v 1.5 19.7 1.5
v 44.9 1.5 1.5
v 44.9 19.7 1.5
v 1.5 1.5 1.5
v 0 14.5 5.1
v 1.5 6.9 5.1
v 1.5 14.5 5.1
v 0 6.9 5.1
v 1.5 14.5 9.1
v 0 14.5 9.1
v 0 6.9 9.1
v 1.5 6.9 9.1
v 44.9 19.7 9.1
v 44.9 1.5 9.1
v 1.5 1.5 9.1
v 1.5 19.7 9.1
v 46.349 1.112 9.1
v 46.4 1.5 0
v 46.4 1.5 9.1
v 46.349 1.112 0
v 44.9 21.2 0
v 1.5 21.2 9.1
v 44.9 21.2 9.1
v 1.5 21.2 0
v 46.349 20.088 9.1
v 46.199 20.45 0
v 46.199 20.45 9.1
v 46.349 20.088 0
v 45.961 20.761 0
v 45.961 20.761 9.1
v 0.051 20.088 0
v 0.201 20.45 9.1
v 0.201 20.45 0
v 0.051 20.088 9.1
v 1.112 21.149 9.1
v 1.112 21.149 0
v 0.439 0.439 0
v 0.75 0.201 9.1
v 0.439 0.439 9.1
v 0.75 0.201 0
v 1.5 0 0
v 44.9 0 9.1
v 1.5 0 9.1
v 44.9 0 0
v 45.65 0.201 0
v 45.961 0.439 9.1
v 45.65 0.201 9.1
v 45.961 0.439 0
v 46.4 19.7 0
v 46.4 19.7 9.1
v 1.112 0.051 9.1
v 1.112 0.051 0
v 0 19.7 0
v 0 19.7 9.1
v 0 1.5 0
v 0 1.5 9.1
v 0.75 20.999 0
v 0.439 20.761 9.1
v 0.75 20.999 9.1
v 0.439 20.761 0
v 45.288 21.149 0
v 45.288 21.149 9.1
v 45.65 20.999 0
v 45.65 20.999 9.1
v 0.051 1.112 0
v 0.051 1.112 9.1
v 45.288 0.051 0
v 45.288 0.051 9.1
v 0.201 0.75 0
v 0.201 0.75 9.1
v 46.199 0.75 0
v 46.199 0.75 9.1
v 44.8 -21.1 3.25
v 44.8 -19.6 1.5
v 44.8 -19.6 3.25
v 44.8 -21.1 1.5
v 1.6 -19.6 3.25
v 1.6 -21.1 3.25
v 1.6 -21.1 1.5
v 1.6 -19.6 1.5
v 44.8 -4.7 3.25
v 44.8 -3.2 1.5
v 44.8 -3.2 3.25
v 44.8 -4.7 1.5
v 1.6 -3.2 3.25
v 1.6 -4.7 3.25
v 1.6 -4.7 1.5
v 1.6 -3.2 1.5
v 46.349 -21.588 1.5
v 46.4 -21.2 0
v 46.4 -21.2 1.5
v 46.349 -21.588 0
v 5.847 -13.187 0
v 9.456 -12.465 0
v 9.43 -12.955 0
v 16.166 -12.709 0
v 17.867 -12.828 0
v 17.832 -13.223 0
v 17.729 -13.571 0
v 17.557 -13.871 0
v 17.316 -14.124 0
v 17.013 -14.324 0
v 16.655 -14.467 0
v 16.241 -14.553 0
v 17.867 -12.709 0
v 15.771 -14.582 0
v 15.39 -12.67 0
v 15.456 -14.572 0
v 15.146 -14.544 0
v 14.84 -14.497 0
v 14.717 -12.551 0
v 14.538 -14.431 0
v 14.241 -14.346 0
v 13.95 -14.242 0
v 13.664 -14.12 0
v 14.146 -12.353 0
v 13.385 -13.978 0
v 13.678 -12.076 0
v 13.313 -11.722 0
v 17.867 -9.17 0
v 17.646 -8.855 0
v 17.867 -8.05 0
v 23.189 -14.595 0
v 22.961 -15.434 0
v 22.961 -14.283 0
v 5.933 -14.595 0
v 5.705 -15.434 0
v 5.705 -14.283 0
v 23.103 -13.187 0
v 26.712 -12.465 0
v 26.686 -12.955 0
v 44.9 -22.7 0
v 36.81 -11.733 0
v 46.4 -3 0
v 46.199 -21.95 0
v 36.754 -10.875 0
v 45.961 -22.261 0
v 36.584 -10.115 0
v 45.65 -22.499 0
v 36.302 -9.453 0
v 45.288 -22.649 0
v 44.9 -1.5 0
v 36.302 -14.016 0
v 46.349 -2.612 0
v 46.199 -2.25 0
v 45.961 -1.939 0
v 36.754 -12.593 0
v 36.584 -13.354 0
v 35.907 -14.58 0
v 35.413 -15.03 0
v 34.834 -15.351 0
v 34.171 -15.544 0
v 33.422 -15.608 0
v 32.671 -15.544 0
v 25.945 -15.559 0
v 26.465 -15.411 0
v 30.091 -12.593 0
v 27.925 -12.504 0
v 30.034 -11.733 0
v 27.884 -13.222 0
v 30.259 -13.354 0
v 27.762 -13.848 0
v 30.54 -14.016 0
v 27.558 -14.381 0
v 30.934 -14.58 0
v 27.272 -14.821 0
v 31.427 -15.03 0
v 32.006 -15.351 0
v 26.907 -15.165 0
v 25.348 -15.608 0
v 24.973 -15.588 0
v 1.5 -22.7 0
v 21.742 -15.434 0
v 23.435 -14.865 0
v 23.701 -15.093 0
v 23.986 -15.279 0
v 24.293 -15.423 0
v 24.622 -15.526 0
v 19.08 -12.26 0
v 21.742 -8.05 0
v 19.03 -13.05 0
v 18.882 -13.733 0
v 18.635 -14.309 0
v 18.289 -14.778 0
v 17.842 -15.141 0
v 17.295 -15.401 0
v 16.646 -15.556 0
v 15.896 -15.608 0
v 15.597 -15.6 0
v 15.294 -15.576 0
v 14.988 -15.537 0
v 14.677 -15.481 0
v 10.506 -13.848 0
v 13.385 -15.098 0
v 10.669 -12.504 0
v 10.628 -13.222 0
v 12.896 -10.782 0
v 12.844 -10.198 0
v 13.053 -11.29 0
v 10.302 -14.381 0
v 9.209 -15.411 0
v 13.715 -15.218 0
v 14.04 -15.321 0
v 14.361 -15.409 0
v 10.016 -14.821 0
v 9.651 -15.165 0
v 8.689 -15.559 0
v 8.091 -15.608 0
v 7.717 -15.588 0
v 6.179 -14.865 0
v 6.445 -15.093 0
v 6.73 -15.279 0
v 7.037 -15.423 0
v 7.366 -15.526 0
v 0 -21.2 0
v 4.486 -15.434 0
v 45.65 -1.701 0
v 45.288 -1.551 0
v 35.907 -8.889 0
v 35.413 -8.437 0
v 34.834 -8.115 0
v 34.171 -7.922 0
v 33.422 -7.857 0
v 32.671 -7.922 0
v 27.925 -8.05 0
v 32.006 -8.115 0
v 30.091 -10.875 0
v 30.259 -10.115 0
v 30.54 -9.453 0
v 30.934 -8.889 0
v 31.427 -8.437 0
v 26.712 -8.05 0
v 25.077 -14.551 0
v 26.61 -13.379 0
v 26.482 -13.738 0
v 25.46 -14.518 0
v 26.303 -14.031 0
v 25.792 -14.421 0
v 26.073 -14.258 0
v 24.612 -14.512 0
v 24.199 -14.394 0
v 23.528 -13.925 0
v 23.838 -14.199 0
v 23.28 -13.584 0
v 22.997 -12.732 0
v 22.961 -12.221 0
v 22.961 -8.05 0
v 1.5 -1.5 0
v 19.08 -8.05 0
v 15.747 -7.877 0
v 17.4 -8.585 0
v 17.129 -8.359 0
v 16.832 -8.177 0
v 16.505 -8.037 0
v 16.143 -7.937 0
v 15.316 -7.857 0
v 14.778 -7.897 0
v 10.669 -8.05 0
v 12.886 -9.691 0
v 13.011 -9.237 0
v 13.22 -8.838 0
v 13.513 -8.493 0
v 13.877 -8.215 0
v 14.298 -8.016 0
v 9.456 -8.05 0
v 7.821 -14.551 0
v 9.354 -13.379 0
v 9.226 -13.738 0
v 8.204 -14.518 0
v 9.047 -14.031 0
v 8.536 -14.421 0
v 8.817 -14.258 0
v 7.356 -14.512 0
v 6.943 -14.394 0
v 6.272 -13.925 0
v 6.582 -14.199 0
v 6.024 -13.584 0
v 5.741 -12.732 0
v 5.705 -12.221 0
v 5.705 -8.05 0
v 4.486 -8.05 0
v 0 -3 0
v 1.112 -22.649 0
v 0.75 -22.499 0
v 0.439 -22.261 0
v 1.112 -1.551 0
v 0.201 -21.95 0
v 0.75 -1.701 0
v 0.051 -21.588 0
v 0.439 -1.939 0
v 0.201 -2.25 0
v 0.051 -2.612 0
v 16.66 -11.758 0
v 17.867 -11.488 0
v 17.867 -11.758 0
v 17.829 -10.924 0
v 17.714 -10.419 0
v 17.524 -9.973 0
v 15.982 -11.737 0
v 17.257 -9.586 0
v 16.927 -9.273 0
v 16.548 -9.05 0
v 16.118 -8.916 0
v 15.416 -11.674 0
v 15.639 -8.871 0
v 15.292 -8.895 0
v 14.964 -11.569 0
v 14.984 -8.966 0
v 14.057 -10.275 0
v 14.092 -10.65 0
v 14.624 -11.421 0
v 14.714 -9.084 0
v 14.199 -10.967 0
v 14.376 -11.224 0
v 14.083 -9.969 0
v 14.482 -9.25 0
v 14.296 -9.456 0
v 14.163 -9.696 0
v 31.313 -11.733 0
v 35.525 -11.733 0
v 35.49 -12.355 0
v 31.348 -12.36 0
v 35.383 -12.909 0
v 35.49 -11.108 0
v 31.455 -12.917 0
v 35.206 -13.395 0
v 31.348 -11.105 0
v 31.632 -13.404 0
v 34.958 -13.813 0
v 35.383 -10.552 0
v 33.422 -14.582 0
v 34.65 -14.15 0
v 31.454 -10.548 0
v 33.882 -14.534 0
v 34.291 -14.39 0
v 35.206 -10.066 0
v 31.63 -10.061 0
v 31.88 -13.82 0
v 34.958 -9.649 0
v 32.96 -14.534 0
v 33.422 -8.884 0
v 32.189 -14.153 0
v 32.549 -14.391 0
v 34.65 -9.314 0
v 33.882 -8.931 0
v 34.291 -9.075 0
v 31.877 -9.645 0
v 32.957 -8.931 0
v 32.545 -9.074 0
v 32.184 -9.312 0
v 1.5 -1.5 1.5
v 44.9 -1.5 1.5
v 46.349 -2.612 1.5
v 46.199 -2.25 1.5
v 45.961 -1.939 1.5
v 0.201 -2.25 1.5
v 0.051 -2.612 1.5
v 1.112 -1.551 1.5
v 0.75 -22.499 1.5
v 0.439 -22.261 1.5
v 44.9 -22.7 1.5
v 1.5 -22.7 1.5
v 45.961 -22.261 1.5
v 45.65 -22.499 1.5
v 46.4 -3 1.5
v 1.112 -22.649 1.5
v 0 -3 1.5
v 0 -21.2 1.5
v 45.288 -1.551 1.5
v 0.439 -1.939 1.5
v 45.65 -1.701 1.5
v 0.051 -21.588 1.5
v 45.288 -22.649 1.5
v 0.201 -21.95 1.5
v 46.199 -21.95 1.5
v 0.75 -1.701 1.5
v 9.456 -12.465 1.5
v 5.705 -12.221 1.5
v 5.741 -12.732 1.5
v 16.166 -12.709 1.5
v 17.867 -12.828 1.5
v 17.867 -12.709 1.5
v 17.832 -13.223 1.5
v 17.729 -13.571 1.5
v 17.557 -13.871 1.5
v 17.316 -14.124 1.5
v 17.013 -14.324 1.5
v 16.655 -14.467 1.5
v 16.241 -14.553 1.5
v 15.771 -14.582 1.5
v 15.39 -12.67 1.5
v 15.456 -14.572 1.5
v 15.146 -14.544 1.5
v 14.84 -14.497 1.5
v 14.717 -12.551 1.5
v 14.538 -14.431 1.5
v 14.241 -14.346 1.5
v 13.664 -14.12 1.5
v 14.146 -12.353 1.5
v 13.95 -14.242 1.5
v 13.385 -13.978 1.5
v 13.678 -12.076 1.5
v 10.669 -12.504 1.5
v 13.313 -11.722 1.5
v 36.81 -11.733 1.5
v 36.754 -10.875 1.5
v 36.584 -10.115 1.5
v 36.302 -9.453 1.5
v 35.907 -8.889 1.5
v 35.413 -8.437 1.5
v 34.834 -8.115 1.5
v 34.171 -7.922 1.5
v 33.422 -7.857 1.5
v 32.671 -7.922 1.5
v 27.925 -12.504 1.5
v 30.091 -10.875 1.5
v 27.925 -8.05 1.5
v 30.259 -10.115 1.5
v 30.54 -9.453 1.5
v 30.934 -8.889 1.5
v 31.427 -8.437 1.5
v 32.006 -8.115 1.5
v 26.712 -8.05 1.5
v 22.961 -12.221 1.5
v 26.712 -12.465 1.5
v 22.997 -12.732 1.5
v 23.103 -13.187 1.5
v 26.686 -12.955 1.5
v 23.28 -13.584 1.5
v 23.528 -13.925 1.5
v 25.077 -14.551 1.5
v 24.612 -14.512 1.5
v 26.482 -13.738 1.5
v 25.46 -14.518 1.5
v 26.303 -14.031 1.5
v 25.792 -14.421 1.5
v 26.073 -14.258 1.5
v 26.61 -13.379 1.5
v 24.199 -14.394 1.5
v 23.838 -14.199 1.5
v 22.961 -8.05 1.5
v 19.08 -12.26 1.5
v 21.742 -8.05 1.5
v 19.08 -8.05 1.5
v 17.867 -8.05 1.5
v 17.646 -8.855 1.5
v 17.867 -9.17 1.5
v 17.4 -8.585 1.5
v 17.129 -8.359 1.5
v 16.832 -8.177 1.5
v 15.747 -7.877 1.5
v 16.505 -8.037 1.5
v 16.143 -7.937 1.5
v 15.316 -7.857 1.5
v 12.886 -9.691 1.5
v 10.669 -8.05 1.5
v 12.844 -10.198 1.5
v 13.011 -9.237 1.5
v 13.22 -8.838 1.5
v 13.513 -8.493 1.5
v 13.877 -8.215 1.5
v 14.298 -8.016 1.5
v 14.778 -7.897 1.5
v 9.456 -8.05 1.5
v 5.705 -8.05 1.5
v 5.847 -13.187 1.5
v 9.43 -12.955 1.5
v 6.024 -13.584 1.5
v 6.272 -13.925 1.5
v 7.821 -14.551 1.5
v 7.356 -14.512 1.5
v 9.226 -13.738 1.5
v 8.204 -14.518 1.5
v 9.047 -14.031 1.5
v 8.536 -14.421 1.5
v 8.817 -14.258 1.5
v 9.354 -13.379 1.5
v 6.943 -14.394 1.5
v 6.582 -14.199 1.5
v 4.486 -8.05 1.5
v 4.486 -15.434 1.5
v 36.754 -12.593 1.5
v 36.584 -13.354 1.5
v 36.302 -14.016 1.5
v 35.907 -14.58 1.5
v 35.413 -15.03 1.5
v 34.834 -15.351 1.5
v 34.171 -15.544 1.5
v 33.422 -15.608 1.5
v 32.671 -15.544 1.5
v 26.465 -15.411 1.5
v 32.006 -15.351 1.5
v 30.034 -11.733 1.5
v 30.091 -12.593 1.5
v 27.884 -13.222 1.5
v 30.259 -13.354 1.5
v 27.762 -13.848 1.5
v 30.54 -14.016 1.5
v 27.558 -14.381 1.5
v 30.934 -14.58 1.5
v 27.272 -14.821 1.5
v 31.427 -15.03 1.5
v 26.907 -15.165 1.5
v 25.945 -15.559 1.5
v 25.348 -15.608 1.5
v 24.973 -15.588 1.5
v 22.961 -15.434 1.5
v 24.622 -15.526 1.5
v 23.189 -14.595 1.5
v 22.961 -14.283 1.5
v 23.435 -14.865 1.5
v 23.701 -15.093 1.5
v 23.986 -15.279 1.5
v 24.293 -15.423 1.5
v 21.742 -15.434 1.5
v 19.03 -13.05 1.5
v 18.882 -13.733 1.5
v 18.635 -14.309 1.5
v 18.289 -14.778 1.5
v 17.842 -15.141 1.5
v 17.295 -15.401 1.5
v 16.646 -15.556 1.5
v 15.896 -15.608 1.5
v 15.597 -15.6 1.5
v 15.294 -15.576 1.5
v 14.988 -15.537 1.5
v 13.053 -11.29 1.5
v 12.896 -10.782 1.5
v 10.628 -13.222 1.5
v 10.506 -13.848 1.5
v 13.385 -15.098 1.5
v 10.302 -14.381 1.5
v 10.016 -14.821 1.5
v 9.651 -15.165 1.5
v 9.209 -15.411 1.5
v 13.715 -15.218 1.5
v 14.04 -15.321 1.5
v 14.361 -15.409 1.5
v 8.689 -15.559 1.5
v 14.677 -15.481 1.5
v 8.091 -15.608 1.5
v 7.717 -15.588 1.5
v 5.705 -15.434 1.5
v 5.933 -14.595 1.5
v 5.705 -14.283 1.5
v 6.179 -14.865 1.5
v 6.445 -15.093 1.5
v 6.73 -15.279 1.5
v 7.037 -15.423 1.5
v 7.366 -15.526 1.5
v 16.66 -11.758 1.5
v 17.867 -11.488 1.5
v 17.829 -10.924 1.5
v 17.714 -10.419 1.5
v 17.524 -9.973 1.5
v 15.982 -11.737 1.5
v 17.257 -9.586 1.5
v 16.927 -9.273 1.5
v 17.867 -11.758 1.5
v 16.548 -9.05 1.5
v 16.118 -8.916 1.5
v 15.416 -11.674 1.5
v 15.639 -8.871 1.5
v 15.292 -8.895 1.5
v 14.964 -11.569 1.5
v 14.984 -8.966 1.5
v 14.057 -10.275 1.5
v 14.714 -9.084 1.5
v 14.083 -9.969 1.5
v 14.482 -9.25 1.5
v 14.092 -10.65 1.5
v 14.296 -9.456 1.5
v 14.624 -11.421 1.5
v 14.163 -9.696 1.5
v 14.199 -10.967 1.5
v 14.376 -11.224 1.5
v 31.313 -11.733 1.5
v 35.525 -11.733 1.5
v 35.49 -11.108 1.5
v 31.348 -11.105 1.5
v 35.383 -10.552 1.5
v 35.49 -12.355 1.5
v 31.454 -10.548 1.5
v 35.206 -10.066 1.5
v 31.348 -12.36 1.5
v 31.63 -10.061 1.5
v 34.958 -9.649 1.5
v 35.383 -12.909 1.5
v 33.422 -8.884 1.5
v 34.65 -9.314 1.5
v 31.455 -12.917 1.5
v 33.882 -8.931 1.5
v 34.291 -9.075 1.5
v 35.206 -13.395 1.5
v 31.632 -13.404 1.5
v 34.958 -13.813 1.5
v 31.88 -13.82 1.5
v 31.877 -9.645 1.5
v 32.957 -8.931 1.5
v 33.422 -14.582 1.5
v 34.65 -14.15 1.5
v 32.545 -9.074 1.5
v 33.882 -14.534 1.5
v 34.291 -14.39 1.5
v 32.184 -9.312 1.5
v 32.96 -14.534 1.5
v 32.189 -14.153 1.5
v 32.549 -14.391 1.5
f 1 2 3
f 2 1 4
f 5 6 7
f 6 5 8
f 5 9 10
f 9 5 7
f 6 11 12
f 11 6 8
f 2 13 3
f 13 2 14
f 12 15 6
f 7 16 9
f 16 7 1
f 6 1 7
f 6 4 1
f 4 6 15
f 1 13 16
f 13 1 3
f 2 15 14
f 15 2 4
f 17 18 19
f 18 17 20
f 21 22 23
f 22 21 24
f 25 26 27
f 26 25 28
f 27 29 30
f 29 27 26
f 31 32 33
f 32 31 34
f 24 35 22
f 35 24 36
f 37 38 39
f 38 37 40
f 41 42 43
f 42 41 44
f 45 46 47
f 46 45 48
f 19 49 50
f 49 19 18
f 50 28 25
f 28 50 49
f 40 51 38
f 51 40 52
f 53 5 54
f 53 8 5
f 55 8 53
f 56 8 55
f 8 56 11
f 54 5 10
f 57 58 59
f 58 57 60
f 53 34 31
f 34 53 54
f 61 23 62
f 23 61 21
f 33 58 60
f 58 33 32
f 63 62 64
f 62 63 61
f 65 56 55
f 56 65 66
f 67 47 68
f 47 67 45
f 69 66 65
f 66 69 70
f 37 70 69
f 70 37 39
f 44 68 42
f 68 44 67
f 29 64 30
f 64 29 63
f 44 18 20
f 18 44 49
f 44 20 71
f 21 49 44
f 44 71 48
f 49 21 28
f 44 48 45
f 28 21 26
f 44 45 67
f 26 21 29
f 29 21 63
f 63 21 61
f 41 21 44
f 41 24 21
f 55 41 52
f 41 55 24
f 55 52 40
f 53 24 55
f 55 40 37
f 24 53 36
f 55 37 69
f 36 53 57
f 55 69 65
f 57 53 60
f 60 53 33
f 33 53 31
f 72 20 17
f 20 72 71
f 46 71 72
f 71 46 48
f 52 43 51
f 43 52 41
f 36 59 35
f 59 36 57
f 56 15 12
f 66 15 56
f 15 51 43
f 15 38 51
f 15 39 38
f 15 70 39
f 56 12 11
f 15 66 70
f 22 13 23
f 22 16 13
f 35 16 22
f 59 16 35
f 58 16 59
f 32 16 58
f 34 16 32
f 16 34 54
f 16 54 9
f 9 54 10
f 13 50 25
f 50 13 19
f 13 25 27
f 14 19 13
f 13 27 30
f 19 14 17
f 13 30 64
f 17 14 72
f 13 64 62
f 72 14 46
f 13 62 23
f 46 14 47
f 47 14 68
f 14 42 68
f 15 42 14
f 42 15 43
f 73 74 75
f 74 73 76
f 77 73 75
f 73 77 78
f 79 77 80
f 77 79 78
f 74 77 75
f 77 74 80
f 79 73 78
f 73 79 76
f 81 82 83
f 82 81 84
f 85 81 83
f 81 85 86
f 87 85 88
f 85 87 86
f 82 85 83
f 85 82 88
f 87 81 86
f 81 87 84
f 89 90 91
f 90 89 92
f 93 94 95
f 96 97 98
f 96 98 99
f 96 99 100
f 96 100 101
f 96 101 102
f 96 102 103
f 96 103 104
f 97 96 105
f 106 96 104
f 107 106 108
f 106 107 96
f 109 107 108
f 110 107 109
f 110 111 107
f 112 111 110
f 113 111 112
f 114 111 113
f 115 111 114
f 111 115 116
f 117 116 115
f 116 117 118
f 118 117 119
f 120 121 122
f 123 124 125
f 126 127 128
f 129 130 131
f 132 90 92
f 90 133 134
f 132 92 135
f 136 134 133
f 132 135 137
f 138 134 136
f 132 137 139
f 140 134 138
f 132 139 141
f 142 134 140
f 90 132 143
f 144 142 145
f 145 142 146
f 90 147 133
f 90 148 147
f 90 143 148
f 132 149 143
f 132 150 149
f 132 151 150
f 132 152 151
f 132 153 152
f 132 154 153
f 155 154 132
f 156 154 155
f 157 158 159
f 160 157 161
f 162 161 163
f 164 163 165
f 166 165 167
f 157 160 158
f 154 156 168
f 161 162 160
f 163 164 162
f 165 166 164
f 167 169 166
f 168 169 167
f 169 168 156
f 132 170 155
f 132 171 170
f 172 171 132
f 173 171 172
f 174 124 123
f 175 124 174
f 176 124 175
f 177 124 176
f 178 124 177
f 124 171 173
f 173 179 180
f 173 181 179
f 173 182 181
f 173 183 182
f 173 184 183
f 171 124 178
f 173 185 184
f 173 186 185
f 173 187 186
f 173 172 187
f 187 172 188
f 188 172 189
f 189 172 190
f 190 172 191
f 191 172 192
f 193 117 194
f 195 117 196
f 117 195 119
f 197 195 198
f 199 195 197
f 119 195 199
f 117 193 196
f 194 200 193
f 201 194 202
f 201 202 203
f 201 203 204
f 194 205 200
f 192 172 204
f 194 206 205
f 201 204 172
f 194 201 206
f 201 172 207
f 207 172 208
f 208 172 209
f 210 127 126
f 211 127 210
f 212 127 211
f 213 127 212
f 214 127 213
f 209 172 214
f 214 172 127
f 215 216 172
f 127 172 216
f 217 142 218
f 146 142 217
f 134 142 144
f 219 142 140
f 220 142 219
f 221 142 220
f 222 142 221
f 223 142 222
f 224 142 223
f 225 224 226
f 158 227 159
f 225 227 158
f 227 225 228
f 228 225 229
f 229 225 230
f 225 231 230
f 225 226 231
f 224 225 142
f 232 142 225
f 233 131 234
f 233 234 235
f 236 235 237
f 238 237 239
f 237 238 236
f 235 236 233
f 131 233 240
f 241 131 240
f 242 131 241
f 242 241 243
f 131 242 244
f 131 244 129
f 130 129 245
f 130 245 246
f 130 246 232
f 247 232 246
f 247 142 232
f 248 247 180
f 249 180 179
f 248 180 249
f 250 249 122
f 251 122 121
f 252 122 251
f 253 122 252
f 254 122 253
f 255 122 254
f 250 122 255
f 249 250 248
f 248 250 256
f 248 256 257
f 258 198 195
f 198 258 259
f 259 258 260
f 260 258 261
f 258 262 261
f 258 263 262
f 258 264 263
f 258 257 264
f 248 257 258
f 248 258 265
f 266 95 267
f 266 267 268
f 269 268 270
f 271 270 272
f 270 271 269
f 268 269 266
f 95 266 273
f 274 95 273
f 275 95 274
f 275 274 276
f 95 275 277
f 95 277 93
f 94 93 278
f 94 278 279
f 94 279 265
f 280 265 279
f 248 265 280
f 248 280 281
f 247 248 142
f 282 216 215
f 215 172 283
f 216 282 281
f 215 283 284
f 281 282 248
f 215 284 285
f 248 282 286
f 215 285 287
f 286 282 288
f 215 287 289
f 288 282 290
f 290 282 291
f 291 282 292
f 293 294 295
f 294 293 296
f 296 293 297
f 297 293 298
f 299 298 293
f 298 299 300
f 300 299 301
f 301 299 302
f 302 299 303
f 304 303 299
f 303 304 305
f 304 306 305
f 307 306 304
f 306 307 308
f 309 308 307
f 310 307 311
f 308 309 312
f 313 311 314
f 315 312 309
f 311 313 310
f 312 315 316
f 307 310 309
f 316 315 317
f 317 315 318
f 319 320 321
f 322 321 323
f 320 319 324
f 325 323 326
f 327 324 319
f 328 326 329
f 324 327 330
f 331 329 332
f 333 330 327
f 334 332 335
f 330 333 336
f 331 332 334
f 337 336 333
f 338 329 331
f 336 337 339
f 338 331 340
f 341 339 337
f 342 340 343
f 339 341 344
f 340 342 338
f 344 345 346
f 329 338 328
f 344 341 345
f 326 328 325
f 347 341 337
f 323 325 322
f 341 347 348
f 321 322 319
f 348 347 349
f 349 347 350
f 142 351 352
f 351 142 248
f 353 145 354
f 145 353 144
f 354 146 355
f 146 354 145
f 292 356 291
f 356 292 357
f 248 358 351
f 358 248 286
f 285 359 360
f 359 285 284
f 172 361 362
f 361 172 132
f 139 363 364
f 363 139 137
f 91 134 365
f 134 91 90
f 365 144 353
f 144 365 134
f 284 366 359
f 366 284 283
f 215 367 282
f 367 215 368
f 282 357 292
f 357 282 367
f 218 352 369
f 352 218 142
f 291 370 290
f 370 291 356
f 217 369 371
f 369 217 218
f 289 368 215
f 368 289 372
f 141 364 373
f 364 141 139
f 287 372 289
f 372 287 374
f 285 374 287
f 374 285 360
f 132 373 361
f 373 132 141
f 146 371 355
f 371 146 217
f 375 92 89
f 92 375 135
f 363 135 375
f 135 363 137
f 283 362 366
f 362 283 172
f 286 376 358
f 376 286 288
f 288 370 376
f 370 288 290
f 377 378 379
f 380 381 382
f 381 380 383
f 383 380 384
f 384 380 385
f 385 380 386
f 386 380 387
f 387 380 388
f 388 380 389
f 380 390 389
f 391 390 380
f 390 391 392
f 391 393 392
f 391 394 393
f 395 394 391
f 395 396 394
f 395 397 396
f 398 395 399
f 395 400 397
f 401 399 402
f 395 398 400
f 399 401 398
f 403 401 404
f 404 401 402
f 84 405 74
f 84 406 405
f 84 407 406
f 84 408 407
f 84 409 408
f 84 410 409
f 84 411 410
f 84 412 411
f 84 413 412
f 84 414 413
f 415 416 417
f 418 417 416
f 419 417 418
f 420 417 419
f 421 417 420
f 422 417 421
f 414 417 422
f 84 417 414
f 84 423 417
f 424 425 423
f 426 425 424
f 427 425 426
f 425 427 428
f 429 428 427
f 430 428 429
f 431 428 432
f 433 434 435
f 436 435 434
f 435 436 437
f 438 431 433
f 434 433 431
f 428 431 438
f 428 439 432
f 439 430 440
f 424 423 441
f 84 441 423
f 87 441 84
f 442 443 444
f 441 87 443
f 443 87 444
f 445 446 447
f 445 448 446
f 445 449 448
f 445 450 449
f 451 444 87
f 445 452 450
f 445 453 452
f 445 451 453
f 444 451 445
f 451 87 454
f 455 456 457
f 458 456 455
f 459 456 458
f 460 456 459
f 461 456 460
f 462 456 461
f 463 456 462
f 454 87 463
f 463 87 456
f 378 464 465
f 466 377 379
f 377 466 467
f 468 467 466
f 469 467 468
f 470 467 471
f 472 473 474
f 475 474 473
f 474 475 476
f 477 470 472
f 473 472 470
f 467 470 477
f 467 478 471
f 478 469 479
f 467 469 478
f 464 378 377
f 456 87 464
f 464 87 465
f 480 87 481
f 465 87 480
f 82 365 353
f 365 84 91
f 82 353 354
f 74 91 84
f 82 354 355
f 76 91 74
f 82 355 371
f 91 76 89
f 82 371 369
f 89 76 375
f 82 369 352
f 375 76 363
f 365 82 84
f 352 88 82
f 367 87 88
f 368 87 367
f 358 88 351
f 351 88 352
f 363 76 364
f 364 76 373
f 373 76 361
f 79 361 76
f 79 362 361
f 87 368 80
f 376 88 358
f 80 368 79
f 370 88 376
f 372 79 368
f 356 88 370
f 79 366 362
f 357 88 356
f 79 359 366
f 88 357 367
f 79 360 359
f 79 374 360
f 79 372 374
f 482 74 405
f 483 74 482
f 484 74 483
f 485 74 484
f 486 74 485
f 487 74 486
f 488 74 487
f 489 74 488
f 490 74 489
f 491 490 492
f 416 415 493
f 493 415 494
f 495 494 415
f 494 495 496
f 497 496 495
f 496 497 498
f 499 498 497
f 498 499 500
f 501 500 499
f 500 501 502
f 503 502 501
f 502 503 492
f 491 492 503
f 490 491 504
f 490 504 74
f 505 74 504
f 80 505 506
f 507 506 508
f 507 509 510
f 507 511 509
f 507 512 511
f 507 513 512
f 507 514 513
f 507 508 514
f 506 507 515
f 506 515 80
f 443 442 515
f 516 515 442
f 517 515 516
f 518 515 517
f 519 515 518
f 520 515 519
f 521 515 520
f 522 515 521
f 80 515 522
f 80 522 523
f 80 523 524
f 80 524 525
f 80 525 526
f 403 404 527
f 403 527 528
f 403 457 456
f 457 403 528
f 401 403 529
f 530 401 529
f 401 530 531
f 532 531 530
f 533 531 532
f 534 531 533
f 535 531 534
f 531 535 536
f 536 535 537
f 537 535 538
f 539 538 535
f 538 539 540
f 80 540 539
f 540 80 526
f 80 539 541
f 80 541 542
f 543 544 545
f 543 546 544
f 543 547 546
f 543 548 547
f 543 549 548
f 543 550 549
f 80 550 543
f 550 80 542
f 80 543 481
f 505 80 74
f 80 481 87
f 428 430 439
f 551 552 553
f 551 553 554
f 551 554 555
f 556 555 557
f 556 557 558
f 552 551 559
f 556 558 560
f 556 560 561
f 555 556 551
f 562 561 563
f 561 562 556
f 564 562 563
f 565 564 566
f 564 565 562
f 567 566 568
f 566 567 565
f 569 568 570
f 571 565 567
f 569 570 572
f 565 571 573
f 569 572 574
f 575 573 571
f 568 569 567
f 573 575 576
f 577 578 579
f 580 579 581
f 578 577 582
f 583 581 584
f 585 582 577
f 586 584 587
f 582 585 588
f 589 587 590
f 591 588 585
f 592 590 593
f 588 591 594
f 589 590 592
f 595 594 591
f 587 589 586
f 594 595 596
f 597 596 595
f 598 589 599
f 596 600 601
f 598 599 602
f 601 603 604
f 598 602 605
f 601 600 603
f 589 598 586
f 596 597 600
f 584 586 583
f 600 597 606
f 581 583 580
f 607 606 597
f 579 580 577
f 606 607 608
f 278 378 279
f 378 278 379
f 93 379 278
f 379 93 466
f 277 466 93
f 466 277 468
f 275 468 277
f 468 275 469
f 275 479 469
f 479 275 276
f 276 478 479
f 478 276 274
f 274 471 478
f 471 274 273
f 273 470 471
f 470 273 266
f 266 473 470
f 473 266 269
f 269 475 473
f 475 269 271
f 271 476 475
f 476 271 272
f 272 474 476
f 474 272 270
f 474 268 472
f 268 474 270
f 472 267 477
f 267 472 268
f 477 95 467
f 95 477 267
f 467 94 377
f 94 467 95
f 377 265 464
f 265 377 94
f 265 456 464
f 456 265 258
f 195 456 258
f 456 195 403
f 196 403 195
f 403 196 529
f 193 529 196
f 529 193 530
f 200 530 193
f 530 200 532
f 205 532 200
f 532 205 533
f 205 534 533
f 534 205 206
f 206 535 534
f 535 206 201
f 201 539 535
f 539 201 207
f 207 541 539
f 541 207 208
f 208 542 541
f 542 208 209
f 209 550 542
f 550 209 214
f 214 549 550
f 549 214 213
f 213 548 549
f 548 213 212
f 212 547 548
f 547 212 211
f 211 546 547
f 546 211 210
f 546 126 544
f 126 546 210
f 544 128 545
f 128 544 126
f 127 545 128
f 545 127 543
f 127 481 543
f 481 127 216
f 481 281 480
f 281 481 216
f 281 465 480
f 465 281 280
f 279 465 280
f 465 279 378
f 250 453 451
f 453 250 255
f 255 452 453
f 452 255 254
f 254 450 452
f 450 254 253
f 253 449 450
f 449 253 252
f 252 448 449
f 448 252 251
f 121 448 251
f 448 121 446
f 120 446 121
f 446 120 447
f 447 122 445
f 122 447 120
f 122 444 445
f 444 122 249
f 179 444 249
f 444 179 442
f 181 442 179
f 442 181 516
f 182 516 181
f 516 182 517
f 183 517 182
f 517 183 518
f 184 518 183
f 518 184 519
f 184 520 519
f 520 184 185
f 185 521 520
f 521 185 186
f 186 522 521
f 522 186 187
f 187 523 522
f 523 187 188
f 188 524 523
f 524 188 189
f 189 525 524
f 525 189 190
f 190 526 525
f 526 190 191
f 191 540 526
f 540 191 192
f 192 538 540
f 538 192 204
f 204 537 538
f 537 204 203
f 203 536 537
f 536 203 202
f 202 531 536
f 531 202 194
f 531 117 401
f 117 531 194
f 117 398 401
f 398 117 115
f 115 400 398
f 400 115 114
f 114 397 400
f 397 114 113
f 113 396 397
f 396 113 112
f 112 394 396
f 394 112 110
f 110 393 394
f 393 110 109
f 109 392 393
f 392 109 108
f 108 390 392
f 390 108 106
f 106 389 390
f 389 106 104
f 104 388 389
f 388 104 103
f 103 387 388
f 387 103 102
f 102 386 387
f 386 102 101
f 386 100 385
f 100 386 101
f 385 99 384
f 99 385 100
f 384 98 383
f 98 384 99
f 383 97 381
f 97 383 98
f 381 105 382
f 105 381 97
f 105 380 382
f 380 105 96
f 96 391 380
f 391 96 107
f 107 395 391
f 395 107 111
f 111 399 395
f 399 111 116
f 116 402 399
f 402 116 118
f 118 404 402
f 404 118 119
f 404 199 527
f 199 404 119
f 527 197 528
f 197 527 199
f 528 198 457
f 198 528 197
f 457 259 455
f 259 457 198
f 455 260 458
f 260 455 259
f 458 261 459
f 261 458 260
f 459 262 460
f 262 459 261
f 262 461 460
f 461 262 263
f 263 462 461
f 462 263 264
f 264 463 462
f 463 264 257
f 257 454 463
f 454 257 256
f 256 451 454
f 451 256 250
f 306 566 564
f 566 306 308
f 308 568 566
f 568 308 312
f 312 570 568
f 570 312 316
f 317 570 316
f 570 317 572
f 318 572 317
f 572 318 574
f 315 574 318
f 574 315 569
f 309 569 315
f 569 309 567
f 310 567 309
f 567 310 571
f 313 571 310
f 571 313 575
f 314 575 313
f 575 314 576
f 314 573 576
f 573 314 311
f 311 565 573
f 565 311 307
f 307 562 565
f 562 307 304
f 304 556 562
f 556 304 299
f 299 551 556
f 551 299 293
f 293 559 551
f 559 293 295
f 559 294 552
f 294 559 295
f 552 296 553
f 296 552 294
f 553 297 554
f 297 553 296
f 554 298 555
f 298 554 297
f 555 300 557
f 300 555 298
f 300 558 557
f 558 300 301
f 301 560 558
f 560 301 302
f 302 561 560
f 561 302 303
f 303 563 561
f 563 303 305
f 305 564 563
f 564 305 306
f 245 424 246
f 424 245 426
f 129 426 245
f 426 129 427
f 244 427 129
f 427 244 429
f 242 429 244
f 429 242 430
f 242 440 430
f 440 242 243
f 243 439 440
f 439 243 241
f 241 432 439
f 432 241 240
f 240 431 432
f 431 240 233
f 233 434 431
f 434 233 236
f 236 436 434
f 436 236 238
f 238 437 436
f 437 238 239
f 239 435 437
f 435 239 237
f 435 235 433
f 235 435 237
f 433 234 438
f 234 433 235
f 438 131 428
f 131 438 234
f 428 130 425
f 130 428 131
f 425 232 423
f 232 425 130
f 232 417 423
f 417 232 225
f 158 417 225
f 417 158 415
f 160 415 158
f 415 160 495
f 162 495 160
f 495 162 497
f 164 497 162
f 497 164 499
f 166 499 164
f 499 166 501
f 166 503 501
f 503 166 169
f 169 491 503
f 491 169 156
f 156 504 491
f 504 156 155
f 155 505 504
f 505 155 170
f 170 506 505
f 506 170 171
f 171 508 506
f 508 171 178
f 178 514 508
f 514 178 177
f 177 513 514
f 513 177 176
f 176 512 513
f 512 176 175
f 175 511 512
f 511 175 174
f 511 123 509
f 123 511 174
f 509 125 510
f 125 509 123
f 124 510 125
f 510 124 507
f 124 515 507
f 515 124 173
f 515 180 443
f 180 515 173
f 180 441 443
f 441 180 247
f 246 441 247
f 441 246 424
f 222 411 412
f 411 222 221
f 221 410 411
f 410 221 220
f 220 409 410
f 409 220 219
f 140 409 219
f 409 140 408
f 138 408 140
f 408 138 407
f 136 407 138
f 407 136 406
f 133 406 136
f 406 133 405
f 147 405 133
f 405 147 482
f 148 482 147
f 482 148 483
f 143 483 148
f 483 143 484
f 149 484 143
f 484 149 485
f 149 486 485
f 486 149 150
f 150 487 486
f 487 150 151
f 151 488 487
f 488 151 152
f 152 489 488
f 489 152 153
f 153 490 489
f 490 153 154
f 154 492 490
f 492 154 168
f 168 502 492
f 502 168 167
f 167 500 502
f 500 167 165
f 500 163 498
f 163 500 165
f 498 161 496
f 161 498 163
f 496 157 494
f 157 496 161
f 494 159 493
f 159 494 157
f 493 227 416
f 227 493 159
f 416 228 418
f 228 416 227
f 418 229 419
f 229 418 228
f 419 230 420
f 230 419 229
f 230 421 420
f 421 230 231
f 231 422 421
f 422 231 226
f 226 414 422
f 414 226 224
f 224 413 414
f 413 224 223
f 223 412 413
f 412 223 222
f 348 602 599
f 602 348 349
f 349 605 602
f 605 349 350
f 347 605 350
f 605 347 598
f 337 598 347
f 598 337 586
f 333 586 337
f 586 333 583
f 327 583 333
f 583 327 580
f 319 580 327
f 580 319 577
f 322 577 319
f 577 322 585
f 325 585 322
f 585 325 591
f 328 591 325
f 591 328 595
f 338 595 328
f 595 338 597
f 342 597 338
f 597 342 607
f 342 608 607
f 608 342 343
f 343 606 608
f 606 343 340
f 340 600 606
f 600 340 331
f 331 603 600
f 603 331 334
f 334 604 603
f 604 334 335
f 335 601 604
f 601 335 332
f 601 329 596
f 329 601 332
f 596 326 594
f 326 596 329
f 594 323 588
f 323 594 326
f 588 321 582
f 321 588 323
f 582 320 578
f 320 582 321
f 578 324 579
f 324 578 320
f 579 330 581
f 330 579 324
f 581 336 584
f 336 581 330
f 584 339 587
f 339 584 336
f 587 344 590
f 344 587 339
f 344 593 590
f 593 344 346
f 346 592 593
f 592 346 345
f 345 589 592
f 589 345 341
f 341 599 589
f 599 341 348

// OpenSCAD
// Teensy++ 2 Enclosure
// Loic - Novemeber 2017


// Board Definition
// This define the specifics of your Board, ie Arduino nano, teensy.
// This module assume a micro usb connector positioned in the midle of the width on on end

board_length 		= 43.2;
board_width			= 18;
top_height			= 4;
pcb_height			= 1.6;
bottom_height		= 2;



// Box
walls_depth		= 1.5;

// Error Margin, avoid sanding
clearance		= 0.1;		// margin for print tolerance .1mm only on x and y axis

label 			= "nano";


// MAIN //
box_rounded();
translate([0,-box_width - walls_depth,0])
	top_rounded_with_label();

// board();
//box();
//translate([0,-box_width - walls_depth,0])
//	top_with_label();

//////////


font_name = "wipeoutfusion";
//font_size = 7.4;
font_size = (board_length / len(label))*0.9;		//	take a guess
font_spacing = 1.05;
label_offset = -0.5;//1.4;									//  for tweaks, because non fixed width font the i and a don't really have the same width

echo(font_size);


$fn=24;

///////
total_board_height = top_height	+ pcb_height + bottom_height;

box_length		= walls_depth + clearance + board_length + clearance + walls_depth;
box_width		= walls_depth + clearance + board_width + clearance + walls_depth;
box_height		= walls_depth + total_board_height;

inside_length	= clearance + board_length + clearance;
inside_width	= clearance + board_width + clearance;
inside_height	= walls_depth + total_board_height;


module board()
{
	connector_position = (board_width / 2) - 3.7;	// middle of the board width - half the size of the micro usb connector

	// Space taken by the components on the bottom of the board
	color("grey", alpha=0.5)
		cube(size=[board_length,board_width,bottom_height], center=false);

	// PCB height, usually constant
	color("green")
		translate([0,0,bottom_height])
		cube(size=[board_length,board_width,pcb_height], center=false);

	// Space taken by the components on the top of the board
	color("grey", alpha=0.5)
		translate([0,0,bottom_height+pcb_height])
		cube(size=[board_length,board_width,top_height], center=false);

	// Micro USB Female connector
	color("grey")
		translate([-1.5,connector_position,bottom_height+pcb_height])		//	the micro usb connector usually stick out by 1.5mm
		cube(size=[9.9,7.6,4], center=false);

	// Add dummy extension to usb port for enclosure hole
	color("grey", alpha=0.5)
		translate([-4.5,connector_position,bottom_height+pcb_height])		//	over shoot a lot on the x axis for hole in box
		cube(size=[9.9+3,7.6,4+0.1], center=false);							// cover the whole connector and overshoot a bit (0.1) on the z axis
}

module label()
{
	position = ((box_length - (len(label)*font_size)) / 2) + label_offset;
	// echo(position);

	translate([position,(box_width/2)+(font_size/2.4),walls_depth*2])
	rotate([180,0,0])
	linear_extrude(walls_depth * 4)
		text(label, font = font_name, size=font_size,spacing=font_spacing);
}

module box_rounded()
{
	difference()
	{
		box_rounded_outside();
		inner_space();
	}
}

module box_rounded_outside()
{
hull()
	{
		translate([walls_depth,walls_depth ,0 ])
			cylinder(box_height, walls_depth, walls_depth, center=false );

		translate([box_length-walls_depth,walls_depth ,0 ])
			cylinder(box_height, walls_depth, walls_depth, center=false);

		translate([box_length-walls_depth, box_width-walls_depth,0 ])
			cylinder(box_height, walls_depth, walls_depth, center=false);

		translate([walls_depth,box_width - walls_depth ,0 ])
			cylinder(box_height, walls_depth, walls_depth, center=false);
	}
}

module top_rounded()
{
hull()
	{
		translate([walls_depth,walls_depth ,0 ])
			cylinder(walls_depth, walls_depth, walls_depth, center=false);

		translate([box_length-walls_depth,walls_depth ,0 ])
			cylinder(walls_depth, walls_depth, walls_depth, center=false);

		translate([box_length-walls_depth, box_width-walls_depth,0 ])
			cylinder(walls_depth, walls_depth, walls_depth, center=false);

		translate([walls_depth,box_width - walls_depth ,0 ])
			cylinder(walls_depth, walls_depth, walls_depth, center=false);
	}
	// tabs / rails
	color("purple")
	{
		translate([walls_depth + clearance, walls_depth + clearance,1])
			cube(size=[box_length - 2*(walls_depth + clearance),walls_depth,walls_depth*1.5], center=false);

		translate([walls_depth + clearance, box_width - 2 * (walls_depth + clearance) ,1])
			cube(size=[box_length - 2*(walls_depth + clearance),walls_depth,walls_depth*1.5], center=false);
	}
}

module top_rounded_with_label()
{
	difference() 
	{
		top_rounded();
		label();
	}
}

module inner_space()
{
		translate([walls_depth,walls_depth,walls_depth])
			cube(size=[inside_length,inside_width,inside_height], center=false);

		translate([walls_depth + clearance,walls_depth + clearance,walls_depth])
		 	board();
}

module top_with_label()
{
	difference()
	{
		top();
		label();
	}
}


module box()
{
difference()
	{
		color("red")
			cube(size=[box_length,box_width,box_height], center=false);

		inner_space();
	}
}

module top()
{
	color("blue")
		cube(size=[box_length,box_width,walls_depth], center=false);

	// tabs / rails
	color("purple")
	{
		translate([walls_depth + clearance, walls_depth + clearance,1])
			cube(size=[box_length - 2*(walls_depth + clearance),walls_depth,walls_depth*1.5], center=false);

		translate([walls_depth + clearance, box_width - 2 * (walls_depth + clearance) ,1])
			cube(size=[box_length - 2*(walls_depth + clearance),walls_depth,walls_depth*1.5], center=false);
	}
}
